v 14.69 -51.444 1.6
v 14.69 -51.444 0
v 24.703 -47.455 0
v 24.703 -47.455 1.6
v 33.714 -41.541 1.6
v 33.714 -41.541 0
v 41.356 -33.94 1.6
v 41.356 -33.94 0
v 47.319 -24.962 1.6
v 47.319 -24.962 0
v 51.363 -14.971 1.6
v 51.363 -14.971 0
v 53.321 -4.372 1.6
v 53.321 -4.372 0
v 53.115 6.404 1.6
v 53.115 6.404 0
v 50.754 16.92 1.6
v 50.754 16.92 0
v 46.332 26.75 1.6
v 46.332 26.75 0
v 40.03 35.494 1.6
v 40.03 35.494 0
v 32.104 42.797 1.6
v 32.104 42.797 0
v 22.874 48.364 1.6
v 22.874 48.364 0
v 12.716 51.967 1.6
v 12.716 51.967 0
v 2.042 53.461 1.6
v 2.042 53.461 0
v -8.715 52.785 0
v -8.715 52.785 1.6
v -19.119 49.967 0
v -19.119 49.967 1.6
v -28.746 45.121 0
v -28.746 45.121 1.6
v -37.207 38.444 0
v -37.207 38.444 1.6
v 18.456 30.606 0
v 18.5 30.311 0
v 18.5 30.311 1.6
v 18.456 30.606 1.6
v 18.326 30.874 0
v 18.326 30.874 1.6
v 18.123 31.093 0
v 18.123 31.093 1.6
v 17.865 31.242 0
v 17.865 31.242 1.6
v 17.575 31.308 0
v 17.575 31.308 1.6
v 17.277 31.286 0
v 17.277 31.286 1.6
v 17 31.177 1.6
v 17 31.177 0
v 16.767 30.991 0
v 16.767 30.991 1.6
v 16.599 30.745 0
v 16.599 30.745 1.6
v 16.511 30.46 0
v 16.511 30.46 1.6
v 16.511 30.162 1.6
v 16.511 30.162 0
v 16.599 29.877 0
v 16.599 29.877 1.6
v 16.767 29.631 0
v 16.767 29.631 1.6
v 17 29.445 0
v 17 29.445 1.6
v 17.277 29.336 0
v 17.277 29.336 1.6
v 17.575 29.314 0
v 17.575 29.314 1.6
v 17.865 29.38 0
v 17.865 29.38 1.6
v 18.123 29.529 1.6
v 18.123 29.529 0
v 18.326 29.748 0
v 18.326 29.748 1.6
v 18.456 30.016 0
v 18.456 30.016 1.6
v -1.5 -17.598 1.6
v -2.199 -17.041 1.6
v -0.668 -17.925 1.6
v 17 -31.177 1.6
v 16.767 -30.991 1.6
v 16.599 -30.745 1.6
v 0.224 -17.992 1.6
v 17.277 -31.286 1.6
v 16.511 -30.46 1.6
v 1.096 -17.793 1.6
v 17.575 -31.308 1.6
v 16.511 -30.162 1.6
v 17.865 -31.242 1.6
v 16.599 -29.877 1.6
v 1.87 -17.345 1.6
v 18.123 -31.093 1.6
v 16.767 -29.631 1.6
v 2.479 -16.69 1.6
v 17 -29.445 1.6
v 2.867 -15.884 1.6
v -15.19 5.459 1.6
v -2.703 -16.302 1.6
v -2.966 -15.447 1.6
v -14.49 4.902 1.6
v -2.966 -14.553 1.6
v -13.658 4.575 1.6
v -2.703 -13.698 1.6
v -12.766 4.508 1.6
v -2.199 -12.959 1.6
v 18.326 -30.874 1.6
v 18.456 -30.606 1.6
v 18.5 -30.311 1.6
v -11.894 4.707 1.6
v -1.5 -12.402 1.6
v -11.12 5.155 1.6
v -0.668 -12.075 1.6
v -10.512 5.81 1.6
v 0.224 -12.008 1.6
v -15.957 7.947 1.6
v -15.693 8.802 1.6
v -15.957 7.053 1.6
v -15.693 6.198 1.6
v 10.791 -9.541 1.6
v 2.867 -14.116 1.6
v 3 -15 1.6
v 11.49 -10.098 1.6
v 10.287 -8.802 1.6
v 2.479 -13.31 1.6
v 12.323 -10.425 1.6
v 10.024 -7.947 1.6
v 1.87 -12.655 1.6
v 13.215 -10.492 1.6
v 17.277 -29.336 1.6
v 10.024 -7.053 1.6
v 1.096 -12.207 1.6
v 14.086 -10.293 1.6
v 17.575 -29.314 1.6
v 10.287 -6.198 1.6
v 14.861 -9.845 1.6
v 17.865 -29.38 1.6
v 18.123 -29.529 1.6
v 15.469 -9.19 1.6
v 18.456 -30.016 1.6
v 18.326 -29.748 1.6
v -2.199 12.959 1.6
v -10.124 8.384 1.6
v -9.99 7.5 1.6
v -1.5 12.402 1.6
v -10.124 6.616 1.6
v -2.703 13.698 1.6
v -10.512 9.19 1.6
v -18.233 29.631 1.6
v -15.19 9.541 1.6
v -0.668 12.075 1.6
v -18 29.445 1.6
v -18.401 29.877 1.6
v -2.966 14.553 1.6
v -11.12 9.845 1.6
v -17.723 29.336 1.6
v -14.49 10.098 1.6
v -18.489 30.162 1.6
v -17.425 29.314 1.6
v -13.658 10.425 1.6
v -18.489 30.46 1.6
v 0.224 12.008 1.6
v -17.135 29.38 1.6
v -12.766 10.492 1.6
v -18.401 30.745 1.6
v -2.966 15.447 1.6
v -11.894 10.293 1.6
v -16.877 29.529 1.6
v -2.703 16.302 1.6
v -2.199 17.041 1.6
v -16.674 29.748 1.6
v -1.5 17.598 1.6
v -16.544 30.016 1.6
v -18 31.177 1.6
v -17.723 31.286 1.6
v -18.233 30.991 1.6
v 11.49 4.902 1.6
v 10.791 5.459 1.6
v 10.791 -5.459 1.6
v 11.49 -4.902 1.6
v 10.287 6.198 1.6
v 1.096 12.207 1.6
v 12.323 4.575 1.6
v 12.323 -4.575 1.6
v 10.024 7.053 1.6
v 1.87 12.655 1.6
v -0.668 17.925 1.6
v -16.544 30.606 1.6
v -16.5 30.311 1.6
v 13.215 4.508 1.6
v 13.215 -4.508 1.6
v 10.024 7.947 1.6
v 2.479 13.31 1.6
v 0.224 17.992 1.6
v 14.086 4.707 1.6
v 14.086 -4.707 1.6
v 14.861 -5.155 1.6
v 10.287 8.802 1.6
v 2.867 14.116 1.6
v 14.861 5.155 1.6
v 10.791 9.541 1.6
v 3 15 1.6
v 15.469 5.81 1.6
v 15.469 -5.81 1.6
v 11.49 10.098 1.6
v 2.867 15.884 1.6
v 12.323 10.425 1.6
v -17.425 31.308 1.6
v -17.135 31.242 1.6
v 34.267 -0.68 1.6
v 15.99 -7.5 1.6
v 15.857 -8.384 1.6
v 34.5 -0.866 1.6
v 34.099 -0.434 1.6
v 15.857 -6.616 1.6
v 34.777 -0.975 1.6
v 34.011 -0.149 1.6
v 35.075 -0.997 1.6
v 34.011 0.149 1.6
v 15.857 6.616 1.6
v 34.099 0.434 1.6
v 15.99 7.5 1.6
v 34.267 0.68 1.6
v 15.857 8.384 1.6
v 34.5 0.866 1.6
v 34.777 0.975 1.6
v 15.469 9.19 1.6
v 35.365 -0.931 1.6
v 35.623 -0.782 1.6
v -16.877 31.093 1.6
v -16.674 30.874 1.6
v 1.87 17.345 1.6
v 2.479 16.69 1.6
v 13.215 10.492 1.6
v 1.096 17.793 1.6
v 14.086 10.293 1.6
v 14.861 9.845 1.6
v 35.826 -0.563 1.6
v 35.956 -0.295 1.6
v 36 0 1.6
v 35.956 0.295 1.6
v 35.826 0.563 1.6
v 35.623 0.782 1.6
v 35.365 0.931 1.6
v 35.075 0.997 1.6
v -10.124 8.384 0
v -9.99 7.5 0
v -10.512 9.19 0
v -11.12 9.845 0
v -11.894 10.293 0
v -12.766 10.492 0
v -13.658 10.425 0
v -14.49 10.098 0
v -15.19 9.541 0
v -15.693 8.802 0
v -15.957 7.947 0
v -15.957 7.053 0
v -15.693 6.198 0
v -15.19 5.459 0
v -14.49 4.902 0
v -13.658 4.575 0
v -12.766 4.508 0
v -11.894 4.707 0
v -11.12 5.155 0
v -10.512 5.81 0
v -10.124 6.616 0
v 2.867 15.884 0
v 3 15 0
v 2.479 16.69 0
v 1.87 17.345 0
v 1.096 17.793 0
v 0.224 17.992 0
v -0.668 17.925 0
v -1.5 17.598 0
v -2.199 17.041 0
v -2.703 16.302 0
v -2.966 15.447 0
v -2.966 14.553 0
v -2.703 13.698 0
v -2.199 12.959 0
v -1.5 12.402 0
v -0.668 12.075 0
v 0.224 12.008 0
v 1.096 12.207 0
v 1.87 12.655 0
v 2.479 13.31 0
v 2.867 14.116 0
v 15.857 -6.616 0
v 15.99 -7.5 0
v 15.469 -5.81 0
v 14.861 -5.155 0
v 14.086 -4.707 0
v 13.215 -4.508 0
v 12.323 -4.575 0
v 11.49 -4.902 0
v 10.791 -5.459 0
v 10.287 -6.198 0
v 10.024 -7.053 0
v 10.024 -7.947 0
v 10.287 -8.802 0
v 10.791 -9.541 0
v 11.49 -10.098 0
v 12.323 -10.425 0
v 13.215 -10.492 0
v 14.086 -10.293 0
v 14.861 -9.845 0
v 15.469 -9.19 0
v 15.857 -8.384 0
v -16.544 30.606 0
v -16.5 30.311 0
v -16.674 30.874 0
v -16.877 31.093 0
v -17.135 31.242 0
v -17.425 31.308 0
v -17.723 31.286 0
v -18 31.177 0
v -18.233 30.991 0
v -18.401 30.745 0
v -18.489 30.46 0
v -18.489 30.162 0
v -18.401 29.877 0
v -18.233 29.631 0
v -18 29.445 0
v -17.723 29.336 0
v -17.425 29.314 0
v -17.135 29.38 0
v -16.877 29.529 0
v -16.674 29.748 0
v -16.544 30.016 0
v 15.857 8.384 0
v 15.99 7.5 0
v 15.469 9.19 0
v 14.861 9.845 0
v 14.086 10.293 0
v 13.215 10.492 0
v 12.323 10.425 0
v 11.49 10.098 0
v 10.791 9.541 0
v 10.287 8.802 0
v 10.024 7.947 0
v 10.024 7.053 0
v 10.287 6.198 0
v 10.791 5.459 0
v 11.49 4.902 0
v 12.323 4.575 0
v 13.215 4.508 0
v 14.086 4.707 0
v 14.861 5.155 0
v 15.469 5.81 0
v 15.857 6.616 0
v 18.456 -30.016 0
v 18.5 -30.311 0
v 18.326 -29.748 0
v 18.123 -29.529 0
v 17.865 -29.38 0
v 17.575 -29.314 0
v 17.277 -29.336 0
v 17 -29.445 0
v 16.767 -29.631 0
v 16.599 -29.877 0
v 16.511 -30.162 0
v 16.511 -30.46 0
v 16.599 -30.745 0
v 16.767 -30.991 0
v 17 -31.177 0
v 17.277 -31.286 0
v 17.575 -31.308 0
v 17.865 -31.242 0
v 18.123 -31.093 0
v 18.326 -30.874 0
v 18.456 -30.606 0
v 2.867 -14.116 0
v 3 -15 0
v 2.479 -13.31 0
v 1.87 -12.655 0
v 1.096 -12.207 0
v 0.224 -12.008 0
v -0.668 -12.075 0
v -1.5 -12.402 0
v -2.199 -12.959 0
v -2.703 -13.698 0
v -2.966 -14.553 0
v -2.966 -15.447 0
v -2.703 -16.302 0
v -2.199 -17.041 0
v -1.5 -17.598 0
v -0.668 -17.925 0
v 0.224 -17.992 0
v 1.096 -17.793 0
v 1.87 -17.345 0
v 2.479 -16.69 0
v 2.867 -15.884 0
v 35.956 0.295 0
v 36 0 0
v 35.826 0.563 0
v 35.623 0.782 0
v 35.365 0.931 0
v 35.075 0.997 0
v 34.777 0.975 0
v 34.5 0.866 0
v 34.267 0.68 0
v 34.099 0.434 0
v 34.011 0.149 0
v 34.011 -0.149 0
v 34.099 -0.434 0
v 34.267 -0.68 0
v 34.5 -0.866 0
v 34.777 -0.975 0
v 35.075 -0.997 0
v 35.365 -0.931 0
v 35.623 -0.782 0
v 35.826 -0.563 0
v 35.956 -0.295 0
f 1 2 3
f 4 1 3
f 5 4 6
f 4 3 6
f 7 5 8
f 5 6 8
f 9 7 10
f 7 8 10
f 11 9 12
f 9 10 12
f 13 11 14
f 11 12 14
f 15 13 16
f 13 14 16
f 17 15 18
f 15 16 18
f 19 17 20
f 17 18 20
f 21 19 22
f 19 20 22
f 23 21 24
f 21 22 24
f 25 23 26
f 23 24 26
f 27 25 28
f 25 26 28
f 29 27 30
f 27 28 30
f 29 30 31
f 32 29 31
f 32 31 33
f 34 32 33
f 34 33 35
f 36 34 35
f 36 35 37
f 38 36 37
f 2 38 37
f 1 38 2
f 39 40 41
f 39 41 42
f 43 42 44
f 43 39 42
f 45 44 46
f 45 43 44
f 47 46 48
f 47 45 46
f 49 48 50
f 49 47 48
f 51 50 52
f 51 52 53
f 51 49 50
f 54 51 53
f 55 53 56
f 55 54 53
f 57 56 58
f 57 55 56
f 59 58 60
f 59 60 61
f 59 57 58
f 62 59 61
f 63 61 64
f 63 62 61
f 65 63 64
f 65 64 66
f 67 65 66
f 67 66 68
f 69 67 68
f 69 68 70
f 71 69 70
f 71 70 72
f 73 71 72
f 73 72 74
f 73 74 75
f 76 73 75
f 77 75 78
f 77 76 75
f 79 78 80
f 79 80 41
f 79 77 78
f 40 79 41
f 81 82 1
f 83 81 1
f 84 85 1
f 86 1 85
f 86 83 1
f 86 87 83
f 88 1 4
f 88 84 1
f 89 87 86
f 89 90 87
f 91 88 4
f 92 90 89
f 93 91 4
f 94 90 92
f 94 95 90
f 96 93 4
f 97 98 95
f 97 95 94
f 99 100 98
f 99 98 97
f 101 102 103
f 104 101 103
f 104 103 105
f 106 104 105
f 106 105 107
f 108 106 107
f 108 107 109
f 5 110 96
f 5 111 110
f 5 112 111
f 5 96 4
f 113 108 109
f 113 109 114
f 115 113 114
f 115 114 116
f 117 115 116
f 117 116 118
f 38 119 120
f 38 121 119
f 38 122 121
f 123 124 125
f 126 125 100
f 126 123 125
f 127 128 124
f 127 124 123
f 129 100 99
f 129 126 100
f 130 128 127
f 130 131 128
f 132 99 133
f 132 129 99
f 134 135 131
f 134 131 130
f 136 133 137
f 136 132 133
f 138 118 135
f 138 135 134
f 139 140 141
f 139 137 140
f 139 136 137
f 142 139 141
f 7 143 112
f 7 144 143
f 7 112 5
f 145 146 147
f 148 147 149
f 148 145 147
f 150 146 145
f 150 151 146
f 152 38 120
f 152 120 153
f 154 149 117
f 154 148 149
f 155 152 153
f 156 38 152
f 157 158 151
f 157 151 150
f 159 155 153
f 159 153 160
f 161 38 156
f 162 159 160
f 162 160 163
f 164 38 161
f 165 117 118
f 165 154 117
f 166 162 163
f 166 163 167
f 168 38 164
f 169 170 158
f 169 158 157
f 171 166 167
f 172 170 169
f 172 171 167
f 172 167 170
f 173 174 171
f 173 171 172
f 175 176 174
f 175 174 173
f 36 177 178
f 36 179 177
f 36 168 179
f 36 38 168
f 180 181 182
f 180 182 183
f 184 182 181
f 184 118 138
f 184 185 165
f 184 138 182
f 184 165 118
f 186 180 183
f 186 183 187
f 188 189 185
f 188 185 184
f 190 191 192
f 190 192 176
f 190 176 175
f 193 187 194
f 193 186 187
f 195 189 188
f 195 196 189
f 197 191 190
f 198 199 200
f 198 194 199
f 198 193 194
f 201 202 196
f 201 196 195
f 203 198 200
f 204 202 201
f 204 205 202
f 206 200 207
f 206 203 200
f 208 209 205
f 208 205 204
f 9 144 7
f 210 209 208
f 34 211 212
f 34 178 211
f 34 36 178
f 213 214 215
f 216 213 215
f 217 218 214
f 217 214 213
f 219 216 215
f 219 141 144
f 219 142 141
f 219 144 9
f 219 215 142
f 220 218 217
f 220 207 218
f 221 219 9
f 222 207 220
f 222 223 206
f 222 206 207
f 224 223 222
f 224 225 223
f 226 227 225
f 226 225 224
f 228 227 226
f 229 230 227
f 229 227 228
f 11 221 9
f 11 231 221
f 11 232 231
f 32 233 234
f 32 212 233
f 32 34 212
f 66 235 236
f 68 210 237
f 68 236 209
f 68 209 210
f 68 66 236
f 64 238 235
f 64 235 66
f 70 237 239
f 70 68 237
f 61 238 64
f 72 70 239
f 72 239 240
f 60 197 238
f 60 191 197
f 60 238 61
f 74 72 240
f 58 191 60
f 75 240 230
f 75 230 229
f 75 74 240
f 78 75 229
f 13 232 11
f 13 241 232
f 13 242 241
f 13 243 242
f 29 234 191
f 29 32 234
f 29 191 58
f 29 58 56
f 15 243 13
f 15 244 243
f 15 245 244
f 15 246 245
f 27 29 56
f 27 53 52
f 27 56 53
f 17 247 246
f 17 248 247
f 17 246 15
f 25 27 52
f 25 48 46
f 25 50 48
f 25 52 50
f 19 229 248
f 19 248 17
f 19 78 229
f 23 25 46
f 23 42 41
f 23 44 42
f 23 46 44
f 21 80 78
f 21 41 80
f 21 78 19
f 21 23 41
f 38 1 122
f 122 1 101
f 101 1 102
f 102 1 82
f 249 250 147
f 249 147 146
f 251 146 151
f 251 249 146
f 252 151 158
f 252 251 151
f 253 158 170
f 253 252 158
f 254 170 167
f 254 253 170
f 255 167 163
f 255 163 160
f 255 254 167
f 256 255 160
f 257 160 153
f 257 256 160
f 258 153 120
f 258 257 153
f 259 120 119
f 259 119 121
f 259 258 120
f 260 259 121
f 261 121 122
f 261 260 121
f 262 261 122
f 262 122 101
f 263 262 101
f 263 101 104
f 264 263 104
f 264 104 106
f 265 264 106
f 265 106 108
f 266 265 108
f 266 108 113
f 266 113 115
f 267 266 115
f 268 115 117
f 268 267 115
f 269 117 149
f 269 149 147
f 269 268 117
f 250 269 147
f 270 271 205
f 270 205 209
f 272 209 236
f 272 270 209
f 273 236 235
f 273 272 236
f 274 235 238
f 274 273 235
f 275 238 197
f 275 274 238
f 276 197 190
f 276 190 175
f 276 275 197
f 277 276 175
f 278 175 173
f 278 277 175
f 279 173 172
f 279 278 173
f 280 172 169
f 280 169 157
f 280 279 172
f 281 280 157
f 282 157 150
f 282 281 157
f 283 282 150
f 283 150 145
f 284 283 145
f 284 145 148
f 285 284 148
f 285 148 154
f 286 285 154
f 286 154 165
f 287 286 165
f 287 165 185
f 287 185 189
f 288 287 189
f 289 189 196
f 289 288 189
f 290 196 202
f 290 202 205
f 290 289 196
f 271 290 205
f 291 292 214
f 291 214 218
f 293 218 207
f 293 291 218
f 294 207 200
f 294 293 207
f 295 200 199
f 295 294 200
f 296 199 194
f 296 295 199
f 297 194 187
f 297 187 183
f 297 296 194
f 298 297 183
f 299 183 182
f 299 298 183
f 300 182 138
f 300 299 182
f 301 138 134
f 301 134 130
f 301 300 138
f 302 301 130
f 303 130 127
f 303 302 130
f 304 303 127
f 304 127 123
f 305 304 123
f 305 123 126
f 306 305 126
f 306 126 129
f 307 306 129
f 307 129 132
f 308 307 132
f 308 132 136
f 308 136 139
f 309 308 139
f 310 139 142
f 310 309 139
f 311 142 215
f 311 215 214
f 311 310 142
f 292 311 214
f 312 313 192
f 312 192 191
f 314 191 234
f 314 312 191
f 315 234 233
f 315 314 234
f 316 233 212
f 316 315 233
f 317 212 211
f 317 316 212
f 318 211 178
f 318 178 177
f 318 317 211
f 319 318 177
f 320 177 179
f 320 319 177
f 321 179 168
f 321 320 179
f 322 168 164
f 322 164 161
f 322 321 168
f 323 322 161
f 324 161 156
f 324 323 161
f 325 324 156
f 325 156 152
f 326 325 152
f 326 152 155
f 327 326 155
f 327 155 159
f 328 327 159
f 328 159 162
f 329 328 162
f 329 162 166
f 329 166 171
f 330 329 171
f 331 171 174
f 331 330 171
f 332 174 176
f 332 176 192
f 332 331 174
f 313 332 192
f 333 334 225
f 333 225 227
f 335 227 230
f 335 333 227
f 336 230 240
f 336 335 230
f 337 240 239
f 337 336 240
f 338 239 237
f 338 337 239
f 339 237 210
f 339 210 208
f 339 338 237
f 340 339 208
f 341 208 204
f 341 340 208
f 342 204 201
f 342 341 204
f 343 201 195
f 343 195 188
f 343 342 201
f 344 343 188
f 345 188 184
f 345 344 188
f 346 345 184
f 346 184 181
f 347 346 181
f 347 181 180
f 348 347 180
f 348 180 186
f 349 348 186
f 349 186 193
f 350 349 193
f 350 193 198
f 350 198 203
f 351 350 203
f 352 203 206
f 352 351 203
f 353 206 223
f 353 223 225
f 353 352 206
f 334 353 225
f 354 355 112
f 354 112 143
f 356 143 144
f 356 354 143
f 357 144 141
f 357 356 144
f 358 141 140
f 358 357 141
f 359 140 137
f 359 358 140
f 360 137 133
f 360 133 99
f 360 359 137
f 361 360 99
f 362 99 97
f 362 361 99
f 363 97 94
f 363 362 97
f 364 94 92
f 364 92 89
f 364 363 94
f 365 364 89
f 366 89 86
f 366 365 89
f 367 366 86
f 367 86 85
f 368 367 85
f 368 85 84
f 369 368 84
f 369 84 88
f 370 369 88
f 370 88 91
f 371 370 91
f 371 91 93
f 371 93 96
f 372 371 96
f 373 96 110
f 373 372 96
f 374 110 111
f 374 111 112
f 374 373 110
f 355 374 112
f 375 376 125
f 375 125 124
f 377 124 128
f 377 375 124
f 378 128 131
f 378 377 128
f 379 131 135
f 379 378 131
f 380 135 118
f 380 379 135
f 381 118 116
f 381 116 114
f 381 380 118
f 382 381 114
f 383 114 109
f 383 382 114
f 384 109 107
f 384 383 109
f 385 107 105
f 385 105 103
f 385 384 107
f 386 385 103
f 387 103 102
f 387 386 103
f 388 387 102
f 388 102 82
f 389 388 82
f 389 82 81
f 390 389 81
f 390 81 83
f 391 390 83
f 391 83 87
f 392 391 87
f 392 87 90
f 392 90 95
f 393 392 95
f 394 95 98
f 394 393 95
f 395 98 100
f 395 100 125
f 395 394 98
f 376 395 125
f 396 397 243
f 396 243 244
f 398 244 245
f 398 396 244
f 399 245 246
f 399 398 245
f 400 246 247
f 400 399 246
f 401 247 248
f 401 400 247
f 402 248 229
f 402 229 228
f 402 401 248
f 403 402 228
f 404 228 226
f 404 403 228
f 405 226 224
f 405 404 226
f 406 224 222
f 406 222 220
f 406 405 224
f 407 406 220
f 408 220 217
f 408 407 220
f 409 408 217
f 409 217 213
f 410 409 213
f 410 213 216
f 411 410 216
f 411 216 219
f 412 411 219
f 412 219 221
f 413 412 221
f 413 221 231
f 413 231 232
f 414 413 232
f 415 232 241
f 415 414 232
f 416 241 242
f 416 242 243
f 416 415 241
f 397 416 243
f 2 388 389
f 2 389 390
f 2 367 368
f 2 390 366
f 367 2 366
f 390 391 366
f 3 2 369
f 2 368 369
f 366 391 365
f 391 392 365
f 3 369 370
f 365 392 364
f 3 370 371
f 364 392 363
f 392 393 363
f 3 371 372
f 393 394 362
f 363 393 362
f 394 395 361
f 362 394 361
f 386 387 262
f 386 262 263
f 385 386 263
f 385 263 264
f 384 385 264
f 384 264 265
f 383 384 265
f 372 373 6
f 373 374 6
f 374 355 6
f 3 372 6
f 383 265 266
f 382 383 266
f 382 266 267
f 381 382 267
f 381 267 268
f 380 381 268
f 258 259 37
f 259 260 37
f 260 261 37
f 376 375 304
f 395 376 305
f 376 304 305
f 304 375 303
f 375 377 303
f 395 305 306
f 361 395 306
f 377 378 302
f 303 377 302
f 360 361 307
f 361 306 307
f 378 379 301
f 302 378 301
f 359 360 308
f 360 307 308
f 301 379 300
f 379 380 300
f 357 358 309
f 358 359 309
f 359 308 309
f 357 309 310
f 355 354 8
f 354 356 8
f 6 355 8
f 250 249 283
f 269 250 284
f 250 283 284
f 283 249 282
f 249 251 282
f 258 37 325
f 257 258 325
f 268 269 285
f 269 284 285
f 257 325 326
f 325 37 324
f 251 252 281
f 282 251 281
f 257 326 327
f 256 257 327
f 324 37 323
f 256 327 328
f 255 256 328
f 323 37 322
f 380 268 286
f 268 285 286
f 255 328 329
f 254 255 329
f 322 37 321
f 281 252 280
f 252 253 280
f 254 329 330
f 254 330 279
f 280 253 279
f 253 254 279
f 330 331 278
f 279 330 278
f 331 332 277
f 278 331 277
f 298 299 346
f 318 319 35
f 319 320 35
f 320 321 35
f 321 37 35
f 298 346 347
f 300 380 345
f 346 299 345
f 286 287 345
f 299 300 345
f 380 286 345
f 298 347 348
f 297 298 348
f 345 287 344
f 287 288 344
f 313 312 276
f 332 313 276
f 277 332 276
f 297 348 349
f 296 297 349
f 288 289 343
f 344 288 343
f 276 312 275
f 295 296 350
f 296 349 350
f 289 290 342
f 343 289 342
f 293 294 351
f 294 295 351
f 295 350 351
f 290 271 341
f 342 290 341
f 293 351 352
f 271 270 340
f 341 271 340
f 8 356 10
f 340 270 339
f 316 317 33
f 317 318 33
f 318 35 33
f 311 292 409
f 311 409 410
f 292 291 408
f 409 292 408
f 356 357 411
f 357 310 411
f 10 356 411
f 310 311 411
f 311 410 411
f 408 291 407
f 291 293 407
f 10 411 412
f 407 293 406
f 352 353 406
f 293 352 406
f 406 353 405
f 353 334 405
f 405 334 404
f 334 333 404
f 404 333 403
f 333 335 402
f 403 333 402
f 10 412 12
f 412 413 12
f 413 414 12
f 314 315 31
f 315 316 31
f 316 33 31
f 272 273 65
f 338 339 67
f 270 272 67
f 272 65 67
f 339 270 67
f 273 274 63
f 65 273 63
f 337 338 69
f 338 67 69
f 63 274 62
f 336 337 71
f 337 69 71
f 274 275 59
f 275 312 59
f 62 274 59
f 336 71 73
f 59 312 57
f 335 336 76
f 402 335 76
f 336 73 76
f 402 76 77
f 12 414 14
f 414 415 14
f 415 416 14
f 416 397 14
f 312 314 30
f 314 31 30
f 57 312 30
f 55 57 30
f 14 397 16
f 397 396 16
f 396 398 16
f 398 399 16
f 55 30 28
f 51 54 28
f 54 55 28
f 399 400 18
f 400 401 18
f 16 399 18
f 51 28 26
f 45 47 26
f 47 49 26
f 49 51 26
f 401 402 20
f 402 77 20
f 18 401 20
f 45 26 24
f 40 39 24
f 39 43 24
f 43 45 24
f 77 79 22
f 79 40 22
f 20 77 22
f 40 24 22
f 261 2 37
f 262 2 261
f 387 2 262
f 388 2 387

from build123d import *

# Parameters (mm, degrees)
ESQUISSE1_R             = 53.5
ESQUISSE1_R_2           = 1
ESQUISSE1_R_3           = 3
BOSS_EXTRU_1_DEPTH      = 1.6
ENL_V_MAT_EXTRU_1_DEPTH = 76.677341391


with BuildPart() as part:
    # Esquisse1 → Boss.-Extru.1 (new body)
    with BuildSketch(Plane.XY):
        Circle(ESQUISSE1_R)
        with Locations((35, 0)):
            Circle(ESQUISSE1_R_2, mode=Mode.SUBTRACT)
        with Locations((17.5, -30.310889132)):
            Circle(ESQUISSE1_R_2, mode=Mode.SUBTRACT)
        with Locations((-17.5, -30.310889132)):
            Circle(ESQUISSE1_R_2, mode=Mode.SUBTRACT)
        with Locations((-35, 0)):
            Circle(ESQUISSE1_R_2, mode=Mode.SUBTRACT)
        with Locations((-17.5, 30.310889132)):
            Circle(ESQUISSE1_R_2, mode=Mode.SUBTRACT)
        with Locations((17.5, 30.310889132)):
            Circle(ESQUISSE1_R_2, mode=Mode.SUBTRACT)
        with Locations((0, -15)):
            Circle(ESQUISSE1_R_3, mode=Mode.SUBTRACT)
        with Locations((12.990381057, -7.5)):
            Circle(ESQUISSE1_R_3, mode=Mode.SUBTRACT)
        with Locations((12.990381057, 7.5)):
            Circle(ESQUISSE1_R_3, mode=Mode.SUBTRACT)
        with Locations((0, 15)):
            Circle(ESQUISSE1_R_3, mode=Mode.SUBTRACT)
        with Locations((-12.990381057, 7.5)):
            Circle(ESQUISSE1_R_3, mode=Mode.SUBTRACT)
    extrude(amount=BOSS_EXTRU_1_DEPTH)

    # Esquisse2 → Enlèv. mat.-Extru.1 (cut, through all)
    with BuildSketch(Plane.XY.offset(1.6)):
        with BuildLine():
            Line((-37.206596087, 38.4437148), (14.689935589, -51.4437148))
            ThreePointArc((14.689935589, -51.4437148), (-46.332359102, -26.75), (-37.206596087, 38.4437148))
        make_face()
    extrude(amount=-ENL_V_MAT_EXTRU_1_DEPTH, mode=Mode.SUBTRACT)


solid = part.part
